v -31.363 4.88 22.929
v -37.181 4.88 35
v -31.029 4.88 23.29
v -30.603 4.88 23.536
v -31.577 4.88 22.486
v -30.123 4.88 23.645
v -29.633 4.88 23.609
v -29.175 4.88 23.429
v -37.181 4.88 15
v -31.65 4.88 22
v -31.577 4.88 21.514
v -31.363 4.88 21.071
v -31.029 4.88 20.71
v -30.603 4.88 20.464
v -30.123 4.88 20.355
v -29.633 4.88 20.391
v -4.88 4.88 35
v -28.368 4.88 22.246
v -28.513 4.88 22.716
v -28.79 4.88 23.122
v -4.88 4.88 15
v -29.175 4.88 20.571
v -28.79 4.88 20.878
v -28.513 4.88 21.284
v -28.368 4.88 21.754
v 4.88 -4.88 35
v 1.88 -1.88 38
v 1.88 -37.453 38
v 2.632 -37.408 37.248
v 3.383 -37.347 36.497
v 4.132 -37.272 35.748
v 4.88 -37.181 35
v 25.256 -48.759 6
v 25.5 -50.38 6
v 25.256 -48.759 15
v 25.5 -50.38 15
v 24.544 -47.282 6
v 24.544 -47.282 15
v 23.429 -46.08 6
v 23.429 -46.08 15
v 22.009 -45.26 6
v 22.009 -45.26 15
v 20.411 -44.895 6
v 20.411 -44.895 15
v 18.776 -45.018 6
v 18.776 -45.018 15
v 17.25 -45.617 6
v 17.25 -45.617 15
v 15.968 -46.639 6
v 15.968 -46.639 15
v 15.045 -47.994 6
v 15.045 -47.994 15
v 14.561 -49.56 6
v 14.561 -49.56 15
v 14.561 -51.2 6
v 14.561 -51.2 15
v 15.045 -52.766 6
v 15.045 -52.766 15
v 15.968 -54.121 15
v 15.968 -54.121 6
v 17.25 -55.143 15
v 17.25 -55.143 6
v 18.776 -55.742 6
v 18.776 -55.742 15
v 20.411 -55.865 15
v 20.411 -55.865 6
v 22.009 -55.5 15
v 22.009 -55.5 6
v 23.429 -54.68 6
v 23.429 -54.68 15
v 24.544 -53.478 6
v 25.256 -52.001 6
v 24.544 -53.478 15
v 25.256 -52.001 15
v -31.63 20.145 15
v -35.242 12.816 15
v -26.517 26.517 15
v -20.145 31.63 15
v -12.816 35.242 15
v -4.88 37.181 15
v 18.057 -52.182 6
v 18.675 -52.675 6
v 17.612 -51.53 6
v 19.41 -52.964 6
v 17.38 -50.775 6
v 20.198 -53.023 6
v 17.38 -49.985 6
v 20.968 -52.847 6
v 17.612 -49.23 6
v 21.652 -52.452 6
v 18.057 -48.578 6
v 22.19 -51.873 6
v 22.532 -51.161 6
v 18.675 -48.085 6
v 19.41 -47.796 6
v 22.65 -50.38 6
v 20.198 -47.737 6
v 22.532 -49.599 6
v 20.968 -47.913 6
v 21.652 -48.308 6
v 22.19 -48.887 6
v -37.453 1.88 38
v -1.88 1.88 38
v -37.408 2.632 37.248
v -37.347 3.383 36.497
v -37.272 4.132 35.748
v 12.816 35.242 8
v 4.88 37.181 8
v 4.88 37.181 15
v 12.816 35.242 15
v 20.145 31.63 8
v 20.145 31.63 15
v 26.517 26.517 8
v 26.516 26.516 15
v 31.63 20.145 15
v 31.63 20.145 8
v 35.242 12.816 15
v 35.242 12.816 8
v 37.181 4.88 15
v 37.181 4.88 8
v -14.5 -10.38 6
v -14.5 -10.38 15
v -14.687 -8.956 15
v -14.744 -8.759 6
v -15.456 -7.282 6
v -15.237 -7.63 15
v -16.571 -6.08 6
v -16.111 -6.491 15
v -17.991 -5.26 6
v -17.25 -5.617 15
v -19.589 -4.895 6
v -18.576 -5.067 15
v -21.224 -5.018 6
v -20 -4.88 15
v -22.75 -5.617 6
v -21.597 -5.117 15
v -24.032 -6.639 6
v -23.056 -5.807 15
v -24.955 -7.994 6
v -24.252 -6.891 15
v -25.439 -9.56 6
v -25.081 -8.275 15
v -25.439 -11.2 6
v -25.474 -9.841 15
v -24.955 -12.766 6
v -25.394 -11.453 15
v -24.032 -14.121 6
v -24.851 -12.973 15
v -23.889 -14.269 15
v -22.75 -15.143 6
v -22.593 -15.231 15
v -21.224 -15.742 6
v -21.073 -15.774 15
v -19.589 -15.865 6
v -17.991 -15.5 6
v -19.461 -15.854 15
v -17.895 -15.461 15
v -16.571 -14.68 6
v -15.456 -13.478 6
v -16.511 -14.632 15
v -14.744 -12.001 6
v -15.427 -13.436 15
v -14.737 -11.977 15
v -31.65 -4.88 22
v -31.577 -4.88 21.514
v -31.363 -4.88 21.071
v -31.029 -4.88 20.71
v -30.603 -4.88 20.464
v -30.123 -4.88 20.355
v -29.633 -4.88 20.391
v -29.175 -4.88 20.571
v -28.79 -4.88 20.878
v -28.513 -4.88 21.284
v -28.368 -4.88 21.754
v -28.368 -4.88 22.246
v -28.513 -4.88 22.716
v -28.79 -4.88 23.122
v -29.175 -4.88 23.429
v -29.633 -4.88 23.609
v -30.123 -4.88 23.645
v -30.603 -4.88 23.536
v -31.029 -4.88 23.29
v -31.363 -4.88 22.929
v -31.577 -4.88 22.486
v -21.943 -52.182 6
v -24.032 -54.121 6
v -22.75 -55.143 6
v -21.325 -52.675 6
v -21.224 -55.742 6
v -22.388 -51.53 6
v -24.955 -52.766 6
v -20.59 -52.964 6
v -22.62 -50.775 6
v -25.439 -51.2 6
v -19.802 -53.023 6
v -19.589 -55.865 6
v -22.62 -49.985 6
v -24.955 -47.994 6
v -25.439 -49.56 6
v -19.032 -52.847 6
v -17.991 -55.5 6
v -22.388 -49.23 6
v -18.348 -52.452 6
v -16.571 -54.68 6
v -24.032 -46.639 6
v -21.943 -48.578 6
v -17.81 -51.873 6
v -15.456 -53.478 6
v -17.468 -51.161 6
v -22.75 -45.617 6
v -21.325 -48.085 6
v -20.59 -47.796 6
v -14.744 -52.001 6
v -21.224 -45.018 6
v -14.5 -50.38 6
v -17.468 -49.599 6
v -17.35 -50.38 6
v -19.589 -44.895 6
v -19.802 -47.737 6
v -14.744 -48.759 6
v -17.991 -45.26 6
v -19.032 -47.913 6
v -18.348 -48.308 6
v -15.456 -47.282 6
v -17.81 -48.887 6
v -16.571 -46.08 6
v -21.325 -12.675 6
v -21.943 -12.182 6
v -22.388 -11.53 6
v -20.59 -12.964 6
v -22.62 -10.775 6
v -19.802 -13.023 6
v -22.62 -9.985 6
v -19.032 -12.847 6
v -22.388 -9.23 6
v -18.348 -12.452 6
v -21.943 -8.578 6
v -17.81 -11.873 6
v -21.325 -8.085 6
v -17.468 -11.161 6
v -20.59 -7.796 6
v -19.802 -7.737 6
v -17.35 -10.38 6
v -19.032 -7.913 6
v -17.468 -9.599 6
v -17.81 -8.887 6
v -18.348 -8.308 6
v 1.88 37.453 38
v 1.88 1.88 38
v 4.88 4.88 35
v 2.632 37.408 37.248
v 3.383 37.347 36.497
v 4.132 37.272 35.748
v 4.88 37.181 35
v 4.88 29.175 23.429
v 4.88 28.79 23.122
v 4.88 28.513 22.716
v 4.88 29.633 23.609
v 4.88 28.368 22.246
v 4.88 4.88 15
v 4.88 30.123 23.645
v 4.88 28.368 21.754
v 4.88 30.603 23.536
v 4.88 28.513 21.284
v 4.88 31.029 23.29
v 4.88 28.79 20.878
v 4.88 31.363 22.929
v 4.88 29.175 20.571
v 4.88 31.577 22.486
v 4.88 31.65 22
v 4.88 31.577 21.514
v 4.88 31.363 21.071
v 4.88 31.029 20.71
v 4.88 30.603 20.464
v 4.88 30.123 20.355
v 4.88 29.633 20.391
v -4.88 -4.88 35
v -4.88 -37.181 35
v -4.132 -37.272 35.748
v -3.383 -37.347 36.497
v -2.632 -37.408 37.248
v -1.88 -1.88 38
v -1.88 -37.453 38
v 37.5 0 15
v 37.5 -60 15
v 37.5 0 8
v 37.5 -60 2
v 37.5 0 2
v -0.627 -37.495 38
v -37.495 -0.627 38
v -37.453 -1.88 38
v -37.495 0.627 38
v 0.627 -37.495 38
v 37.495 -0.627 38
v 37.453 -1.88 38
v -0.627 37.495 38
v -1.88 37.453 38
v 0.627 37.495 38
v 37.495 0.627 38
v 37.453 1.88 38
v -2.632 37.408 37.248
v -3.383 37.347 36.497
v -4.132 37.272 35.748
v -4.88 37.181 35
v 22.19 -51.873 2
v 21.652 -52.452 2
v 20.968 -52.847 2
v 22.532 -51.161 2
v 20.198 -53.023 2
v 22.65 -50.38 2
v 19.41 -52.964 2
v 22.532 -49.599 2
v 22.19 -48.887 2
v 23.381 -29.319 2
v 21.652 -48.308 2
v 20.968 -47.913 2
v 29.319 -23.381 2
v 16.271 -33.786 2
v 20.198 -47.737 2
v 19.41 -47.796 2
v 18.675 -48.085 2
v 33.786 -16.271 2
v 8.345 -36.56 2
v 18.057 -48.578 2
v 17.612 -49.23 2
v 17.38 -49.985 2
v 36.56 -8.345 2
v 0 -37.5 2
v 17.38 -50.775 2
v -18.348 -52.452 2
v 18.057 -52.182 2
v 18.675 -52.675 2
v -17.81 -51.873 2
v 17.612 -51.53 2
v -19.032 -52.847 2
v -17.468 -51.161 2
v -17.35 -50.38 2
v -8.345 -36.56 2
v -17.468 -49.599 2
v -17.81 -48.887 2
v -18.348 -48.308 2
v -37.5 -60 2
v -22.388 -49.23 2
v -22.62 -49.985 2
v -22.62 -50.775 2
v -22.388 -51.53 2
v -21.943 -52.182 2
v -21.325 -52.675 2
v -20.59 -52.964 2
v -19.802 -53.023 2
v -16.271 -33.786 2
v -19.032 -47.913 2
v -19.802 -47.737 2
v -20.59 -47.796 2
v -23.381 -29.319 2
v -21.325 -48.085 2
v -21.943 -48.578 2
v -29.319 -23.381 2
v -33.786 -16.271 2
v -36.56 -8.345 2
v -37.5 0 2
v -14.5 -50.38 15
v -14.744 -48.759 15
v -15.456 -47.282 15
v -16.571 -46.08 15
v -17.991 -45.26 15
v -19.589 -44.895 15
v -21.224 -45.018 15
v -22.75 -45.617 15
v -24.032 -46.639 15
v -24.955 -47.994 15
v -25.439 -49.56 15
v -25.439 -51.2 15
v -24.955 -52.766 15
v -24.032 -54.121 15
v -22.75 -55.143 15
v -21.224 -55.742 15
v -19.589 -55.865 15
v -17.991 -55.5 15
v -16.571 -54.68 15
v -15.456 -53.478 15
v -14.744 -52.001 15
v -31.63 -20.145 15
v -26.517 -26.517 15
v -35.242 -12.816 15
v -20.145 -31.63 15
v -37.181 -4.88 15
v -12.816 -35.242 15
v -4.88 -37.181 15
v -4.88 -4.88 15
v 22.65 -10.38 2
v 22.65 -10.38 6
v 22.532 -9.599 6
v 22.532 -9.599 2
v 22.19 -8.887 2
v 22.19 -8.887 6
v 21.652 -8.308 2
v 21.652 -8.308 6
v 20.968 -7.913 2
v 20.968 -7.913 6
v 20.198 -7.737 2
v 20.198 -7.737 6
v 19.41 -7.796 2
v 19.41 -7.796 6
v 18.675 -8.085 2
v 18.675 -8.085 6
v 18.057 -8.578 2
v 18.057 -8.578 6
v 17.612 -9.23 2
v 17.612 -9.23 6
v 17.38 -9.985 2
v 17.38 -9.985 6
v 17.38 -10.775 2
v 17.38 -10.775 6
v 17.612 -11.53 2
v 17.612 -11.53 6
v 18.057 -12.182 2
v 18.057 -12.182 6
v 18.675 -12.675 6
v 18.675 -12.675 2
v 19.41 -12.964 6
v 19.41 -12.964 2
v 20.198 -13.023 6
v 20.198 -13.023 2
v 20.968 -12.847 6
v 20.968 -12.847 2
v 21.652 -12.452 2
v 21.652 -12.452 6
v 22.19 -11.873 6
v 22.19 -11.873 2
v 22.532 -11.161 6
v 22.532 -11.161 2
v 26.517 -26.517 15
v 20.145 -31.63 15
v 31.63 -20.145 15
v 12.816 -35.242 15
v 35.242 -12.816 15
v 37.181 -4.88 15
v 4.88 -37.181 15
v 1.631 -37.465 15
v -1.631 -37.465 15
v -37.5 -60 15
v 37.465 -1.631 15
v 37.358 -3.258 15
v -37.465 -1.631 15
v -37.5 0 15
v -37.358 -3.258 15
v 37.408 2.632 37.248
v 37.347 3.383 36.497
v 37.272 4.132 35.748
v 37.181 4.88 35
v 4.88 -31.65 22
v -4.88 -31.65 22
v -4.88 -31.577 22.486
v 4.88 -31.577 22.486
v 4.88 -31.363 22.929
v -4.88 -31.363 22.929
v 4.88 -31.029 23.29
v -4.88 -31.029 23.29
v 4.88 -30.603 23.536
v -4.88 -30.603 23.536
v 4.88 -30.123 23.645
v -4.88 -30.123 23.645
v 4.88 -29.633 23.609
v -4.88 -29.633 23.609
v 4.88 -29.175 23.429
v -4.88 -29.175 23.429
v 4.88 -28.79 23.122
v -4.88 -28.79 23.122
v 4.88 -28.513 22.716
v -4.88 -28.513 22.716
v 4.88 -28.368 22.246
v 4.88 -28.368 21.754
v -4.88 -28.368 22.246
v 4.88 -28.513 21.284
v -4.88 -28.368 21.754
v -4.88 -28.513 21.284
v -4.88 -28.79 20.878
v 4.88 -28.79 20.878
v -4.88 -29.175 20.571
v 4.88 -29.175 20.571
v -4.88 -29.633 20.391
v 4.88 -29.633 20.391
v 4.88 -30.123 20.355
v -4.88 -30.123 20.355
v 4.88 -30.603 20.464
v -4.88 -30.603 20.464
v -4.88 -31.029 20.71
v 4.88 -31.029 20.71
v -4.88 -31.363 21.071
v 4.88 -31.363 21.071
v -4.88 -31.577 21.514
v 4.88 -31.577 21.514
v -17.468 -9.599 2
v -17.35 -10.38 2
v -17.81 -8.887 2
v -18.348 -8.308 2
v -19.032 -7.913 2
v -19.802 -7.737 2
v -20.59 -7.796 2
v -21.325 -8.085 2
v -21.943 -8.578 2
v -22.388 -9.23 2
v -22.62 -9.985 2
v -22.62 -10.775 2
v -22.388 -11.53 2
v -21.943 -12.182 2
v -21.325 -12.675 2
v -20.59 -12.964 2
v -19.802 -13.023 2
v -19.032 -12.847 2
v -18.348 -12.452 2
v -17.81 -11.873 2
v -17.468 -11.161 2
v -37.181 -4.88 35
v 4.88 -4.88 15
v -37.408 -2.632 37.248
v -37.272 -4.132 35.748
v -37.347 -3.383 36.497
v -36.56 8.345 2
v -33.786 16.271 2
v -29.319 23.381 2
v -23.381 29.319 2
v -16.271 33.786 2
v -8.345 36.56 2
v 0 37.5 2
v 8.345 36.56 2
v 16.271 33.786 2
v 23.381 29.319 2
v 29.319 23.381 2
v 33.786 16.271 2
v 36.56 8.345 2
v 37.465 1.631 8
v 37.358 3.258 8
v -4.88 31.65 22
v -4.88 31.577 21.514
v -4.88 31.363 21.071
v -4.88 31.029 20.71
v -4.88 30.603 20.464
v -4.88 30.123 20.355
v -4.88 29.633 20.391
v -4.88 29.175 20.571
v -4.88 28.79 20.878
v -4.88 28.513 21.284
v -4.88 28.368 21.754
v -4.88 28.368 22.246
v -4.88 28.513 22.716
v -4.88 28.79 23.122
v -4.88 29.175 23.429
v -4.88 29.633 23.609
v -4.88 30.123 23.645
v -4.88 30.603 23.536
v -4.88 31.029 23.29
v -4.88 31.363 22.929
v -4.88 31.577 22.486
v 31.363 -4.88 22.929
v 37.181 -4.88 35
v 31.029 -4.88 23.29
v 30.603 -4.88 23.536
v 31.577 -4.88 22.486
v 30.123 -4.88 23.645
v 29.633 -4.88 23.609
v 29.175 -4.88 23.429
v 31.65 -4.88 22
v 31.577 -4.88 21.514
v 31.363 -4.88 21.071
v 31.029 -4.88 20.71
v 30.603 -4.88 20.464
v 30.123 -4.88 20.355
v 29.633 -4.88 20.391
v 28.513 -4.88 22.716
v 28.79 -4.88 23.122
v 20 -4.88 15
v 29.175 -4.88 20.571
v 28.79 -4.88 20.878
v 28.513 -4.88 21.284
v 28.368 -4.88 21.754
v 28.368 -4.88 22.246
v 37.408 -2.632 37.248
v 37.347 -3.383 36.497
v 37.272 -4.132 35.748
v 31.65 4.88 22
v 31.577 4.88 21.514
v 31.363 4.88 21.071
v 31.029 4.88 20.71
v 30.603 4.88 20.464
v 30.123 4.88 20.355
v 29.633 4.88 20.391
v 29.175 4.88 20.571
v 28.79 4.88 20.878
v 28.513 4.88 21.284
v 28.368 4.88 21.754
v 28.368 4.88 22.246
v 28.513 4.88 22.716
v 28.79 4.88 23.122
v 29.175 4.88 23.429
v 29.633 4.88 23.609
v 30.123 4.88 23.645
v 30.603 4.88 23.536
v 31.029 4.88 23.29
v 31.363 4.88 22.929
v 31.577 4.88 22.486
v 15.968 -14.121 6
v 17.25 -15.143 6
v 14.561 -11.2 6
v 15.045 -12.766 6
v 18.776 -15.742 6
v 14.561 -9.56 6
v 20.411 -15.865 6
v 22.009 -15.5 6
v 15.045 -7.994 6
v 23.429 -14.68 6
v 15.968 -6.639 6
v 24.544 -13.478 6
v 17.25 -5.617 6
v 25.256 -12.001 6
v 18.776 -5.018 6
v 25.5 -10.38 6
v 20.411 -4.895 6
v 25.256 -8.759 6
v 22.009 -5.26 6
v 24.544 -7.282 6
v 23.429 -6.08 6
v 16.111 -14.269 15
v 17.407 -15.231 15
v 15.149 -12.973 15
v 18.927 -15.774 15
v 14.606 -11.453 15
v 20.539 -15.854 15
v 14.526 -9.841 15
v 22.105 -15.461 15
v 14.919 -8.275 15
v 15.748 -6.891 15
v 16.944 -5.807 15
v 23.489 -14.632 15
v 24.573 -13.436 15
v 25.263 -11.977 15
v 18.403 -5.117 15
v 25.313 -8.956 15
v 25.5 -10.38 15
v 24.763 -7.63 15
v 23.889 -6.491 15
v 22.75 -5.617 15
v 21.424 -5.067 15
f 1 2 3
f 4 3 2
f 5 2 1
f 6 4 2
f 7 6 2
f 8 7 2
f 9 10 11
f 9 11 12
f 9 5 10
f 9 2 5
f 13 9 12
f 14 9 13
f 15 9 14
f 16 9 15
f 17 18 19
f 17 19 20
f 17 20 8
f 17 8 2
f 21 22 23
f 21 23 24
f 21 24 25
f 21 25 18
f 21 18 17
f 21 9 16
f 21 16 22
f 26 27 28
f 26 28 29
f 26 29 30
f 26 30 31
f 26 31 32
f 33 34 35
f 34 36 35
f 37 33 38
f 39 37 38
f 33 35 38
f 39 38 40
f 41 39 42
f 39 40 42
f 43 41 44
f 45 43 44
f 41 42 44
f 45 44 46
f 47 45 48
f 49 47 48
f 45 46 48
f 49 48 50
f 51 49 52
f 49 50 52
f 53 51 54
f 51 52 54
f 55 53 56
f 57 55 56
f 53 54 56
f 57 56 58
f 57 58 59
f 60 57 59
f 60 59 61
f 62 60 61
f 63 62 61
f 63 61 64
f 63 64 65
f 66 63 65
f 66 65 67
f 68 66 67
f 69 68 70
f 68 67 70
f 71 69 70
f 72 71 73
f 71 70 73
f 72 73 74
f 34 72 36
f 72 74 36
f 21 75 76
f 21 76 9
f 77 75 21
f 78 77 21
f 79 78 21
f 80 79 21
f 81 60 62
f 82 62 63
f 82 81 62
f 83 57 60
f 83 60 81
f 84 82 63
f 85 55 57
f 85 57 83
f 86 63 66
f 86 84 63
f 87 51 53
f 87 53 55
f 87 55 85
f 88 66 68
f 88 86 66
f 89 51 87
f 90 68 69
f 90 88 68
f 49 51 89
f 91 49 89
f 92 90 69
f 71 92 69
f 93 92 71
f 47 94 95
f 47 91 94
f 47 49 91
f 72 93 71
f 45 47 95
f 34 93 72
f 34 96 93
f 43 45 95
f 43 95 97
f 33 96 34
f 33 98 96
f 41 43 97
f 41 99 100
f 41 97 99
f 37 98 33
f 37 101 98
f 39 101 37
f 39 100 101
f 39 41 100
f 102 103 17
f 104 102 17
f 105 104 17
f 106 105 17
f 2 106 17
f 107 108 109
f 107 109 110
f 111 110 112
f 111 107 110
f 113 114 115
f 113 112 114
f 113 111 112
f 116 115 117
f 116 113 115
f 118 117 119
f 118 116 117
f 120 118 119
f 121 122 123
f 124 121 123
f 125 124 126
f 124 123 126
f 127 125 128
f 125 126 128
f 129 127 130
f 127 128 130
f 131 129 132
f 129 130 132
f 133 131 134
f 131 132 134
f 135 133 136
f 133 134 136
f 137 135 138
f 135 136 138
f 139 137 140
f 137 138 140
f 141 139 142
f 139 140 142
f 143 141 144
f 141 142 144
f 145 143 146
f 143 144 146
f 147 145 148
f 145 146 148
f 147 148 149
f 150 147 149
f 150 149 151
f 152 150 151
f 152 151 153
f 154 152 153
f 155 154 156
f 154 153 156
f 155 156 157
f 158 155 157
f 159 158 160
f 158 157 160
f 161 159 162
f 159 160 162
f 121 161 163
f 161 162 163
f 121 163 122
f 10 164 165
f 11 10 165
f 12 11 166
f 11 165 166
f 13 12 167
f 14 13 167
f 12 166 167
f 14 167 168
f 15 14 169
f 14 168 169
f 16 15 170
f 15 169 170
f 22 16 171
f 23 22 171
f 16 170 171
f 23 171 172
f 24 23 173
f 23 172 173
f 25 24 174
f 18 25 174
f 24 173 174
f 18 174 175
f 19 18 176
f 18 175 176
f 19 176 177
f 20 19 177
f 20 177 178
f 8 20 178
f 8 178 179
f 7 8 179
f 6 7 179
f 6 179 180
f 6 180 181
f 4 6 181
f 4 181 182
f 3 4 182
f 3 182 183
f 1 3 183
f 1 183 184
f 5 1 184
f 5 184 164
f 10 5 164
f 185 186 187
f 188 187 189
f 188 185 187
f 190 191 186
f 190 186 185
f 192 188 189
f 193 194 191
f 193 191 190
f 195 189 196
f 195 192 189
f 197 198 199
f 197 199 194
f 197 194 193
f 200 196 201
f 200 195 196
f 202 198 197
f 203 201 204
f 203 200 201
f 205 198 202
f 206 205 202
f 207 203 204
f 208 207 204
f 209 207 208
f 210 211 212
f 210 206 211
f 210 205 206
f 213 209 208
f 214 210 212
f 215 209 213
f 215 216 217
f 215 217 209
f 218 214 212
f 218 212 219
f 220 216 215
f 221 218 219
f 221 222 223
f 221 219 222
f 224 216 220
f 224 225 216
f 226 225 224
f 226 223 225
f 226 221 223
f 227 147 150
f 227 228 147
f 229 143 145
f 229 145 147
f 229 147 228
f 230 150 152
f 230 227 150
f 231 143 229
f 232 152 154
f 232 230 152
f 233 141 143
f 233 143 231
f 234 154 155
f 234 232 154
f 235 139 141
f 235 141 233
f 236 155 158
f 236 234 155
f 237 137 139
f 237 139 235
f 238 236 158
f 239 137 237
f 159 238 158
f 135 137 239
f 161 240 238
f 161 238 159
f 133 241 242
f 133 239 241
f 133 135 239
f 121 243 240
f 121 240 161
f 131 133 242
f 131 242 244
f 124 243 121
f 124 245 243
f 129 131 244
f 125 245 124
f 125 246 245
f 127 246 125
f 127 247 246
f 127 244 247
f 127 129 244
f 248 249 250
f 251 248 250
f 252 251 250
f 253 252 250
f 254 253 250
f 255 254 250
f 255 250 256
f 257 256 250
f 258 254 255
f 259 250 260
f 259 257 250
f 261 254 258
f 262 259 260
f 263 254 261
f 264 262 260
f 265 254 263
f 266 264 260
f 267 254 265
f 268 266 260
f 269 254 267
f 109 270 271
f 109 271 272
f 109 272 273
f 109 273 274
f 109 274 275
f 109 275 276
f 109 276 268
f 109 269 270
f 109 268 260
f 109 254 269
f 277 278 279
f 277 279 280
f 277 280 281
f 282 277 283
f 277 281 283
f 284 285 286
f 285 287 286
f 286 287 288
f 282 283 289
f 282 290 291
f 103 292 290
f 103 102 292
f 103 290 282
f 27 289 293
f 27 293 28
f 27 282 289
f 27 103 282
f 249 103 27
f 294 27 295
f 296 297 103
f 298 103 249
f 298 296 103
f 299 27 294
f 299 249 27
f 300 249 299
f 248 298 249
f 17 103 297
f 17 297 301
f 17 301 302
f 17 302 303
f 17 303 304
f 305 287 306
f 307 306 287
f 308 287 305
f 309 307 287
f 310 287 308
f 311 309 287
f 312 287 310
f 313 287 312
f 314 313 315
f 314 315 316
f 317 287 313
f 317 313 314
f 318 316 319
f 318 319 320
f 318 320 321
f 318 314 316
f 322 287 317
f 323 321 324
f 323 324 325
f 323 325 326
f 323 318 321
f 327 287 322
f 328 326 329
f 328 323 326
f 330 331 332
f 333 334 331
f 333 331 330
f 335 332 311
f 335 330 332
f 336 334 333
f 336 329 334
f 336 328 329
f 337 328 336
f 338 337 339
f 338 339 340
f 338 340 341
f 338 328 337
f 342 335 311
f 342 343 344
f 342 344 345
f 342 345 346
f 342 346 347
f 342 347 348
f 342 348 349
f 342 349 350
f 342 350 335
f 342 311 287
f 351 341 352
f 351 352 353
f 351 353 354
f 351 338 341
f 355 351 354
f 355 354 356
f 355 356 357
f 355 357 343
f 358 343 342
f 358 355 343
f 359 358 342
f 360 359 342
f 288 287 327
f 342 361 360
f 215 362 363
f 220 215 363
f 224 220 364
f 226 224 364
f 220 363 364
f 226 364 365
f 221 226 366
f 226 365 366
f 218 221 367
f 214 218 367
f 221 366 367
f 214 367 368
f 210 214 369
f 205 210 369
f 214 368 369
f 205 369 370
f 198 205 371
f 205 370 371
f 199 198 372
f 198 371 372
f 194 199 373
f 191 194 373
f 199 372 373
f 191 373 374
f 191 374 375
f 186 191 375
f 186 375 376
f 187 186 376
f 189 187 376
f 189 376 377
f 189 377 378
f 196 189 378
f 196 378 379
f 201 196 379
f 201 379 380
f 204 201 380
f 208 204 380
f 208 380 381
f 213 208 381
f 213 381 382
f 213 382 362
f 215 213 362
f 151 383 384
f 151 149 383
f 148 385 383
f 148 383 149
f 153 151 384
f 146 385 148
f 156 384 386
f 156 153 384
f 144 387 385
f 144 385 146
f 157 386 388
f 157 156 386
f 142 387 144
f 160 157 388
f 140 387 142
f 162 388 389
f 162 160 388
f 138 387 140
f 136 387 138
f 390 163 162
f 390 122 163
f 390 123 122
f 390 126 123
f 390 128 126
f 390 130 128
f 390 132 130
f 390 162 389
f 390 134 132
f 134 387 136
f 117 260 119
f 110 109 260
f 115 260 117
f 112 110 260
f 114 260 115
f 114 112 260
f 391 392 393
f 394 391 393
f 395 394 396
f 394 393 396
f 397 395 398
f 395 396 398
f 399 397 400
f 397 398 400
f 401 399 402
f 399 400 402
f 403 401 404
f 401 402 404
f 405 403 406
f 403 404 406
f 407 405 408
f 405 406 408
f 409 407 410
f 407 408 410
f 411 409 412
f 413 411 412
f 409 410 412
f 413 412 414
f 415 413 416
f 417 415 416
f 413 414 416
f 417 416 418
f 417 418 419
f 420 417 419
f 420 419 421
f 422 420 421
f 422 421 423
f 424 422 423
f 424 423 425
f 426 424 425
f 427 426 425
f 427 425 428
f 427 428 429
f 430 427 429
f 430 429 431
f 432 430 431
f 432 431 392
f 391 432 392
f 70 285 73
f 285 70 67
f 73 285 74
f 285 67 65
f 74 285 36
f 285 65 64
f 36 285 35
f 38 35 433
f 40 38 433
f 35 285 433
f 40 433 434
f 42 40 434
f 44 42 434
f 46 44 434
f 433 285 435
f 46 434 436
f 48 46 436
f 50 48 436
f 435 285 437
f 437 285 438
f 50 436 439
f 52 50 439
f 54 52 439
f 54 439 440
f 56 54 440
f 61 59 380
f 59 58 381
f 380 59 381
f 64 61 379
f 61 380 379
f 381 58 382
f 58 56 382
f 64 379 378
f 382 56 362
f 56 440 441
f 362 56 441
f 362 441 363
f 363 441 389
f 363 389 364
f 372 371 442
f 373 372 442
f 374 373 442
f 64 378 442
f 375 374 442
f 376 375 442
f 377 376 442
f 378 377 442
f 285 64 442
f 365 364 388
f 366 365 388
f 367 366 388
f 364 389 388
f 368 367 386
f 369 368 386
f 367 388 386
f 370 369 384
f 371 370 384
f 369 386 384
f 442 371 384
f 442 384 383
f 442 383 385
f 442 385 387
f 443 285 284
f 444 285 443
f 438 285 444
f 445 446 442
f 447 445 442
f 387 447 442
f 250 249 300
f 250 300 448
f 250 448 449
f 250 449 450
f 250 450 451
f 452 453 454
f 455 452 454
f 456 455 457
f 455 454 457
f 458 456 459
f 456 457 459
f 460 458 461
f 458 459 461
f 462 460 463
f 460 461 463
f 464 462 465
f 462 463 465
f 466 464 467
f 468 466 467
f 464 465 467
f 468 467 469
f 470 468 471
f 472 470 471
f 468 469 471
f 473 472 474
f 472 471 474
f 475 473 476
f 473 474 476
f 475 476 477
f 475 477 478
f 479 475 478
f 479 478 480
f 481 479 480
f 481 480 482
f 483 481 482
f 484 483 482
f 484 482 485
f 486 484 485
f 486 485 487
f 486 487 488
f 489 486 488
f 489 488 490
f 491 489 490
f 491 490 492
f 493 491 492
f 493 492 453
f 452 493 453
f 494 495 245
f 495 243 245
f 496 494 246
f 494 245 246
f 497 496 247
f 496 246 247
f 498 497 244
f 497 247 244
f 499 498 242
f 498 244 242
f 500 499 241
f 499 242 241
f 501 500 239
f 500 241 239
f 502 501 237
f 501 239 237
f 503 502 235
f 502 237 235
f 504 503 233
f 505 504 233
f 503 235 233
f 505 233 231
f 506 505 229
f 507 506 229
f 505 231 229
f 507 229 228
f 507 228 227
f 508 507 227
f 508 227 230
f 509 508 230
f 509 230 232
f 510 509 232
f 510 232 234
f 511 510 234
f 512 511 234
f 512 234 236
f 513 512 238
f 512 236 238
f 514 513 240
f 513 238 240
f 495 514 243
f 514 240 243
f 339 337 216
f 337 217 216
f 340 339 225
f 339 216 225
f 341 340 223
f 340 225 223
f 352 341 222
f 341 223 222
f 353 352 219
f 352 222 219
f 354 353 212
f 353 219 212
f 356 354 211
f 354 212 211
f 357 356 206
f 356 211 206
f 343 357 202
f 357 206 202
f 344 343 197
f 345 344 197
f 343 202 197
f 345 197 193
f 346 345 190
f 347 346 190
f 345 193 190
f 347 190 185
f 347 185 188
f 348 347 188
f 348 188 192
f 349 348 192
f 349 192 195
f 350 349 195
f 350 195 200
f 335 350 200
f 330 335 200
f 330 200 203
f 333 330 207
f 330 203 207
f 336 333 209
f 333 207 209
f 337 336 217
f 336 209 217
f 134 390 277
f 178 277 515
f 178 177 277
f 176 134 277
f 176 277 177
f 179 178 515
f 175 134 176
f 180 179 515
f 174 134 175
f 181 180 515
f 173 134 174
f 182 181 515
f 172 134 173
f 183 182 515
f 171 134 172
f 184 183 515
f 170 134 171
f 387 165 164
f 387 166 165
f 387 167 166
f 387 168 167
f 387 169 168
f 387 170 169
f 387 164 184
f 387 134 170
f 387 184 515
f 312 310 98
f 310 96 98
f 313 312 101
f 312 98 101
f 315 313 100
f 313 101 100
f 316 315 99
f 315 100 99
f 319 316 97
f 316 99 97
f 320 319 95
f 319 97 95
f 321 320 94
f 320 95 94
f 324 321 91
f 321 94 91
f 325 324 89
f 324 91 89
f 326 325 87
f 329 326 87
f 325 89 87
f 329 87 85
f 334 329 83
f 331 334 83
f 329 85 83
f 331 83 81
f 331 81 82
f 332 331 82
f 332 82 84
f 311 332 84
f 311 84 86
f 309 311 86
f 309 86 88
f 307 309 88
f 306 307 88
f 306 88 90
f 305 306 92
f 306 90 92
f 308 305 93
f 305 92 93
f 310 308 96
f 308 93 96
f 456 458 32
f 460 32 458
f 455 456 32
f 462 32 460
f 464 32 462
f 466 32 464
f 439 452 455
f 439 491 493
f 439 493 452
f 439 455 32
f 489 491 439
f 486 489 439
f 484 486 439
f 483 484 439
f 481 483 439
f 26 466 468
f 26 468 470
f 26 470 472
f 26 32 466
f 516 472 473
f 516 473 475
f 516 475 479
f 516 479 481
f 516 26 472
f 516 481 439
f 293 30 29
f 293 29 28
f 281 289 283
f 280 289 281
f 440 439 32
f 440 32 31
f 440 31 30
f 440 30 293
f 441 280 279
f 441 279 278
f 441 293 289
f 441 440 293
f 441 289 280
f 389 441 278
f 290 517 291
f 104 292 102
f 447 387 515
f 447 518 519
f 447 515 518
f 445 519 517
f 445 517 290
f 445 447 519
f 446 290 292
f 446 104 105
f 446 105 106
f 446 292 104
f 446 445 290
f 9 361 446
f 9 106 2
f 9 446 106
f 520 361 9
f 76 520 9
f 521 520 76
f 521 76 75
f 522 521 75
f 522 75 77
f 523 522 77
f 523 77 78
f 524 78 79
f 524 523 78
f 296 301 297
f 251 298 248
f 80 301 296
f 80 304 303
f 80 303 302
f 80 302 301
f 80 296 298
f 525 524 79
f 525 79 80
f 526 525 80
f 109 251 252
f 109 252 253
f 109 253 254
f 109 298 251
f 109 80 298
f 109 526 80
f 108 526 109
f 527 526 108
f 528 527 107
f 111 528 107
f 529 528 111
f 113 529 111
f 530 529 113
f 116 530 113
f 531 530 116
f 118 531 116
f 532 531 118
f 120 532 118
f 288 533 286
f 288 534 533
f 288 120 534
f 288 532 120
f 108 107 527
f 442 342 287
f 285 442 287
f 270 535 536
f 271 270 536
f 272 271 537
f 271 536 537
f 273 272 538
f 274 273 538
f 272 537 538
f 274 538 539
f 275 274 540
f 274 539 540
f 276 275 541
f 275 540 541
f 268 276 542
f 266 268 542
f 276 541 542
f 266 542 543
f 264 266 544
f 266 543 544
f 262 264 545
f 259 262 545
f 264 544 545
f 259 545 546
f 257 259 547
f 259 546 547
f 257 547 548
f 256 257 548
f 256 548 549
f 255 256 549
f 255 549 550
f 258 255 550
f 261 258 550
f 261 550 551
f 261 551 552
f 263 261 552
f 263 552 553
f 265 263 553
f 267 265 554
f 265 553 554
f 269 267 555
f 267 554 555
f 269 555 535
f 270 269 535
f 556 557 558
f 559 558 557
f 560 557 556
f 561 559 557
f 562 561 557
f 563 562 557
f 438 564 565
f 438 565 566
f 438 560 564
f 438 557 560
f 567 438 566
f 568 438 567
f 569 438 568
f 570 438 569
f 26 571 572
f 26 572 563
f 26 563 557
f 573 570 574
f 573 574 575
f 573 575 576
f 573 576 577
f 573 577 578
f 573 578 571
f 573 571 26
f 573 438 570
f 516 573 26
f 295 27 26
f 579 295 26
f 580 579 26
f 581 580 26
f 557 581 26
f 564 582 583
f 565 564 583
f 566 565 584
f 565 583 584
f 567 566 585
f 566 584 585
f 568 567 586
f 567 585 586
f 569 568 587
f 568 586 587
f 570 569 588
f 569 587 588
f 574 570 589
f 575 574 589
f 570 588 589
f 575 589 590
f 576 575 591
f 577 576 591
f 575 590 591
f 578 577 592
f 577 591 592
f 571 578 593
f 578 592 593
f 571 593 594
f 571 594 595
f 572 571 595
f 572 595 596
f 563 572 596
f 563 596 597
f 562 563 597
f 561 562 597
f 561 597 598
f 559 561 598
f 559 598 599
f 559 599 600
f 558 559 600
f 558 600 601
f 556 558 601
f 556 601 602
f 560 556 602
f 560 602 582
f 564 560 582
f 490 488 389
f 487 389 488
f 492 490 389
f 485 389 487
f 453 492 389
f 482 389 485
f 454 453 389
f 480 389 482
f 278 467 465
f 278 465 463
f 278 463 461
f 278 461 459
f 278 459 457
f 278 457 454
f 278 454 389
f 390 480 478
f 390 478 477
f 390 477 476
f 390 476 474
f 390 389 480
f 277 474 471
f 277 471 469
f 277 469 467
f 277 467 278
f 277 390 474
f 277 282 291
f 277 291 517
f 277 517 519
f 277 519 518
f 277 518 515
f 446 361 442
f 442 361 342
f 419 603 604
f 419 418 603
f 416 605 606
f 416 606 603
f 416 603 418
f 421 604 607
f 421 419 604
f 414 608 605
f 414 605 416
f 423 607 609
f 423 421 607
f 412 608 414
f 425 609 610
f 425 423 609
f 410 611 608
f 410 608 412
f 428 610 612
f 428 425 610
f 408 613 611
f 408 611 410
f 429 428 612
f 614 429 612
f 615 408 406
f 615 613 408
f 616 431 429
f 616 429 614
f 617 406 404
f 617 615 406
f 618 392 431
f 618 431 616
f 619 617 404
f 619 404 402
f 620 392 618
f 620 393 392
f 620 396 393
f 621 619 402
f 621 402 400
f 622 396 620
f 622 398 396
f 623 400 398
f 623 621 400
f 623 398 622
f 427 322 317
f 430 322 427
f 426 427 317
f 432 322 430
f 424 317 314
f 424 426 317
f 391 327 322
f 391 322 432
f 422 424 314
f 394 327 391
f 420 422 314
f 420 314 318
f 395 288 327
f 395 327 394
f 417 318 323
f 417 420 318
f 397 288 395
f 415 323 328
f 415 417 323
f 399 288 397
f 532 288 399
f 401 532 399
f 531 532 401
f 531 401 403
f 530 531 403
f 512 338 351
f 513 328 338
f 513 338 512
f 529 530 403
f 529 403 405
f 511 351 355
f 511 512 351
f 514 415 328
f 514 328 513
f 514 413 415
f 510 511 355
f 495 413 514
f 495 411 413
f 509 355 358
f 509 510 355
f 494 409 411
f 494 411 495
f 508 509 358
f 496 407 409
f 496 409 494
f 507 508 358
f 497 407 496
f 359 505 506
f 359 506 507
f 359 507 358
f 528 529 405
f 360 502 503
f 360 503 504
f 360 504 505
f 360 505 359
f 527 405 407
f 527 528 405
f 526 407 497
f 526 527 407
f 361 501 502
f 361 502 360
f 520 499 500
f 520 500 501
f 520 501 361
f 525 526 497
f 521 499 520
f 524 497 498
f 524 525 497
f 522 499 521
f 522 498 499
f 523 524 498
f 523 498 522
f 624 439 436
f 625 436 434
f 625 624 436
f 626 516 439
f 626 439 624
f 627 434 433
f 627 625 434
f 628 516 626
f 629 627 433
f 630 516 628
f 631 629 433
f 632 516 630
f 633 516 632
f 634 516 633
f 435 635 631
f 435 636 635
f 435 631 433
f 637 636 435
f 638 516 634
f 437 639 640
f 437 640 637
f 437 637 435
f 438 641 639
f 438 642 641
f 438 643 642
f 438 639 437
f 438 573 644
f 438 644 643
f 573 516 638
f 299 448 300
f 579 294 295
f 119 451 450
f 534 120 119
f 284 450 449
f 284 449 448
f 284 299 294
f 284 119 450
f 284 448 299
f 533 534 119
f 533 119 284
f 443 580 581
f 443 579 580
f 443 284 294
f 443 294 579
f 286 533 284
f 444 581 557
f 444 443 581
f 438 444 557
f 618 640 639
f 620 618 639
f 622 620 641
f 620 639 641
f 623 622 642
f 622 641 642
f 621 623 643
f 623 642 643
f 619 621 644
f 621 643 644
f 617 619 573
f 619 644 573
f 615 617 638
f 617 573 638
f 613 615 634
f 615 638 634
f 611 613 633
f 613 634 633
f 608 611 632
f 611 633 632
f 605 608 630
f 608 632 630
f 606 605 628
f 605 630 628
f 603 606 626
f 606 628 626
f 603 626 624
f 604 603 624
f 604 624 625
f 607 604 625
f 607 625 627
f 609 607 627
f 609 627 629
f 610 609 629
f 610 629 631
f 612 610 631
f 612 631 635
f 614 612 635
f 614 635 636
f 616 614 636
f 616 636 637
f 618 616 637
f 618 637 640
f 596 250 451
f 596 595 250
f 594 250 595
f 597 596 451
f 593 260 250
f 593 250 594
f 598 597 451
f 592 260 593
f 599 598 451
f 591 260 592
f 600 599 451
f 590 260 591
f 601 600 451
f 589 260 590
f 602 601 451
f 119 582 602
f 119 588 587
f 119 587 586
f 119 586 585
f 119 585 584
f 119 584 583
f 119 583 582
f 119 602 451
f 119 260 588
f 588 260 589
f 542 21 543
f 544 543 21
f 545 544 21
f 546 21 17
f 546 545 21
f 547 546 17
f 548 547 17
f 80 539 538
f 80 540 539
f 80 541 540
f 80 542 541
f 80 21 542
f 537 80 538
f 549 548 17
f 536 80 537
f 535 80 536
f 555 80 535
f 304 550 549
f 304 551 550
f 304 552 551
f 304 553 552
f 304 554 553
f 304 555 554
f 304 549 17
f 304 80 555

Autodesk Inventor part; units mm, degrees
ref_plane "YZ Plane" through (0, 0, 0) normal (1, 0, 0) x (0, 1, 0)
ref_plane "XZ Plane" through (0, 0, 0) normal (0, 1, 0) x (-1, 0, 0)
ref_plane "XY Plane" through (0, 0, 0) normal (0, 0, 1) x (1, 0, 0)
sketch "Sketch1" plane through (0, 0, 0) normal (0, 0, 1) x (1, 0, 0)
  circle A0 centre (0, 0) radius 37.5
  line L0 (0, 0) -> (0, -25)
  circle A1 centre (0, -25) radius 3
  dimension "d0" = 75
  dimension "d1" = 25
  dimension "d2" = 6
extrude "Extrusion1" add sketch "Sketch1" along normal blind 8 contours A0 | A1
sketch "Sketch2" plane through (0, 0, 8) normal (0, 0, 1) x (1, 0, 0)
  line L0 (0, 0) -> (17.6777, 17.6777)
  line L1 (0, 0) -> (25, 0) construction
  circle A0 centre (17.6777, 17.6777) radius 3.15
  circle A1 centre (-17.6777, 17.6777) radius 3.15
  circle A2 centre (-17.6777, -17.6777) radius 3.15
  circle A3 centre (17.6777, -17.6777) radius 3.15
  dimension "d5" = 25
  dimension "d6" = 45
  dimension "d7" = 6.3
  dimension "d10" = 360
extrude "Extrusion2" cut sketch "Sketch2" against normal blind 10
sketch "Sketch3" plane through (0, 0, 8) normal (0, 0, 1) x (1, 0, 0)
  arc A0 (-21.9203, 13.435) -> (-13.435, 21.9203) centre (-17.6777, 17.6777) ccw
  line L0 (-17.6777, 17.6777) -> (-11.6777, 17.6777) construction
  line L1 (-13.435, 21.9203) -> (-19.9189, 28.4042)
  line L2 (-21.9203, 13.435) -> (-28.4042, 19.9189)
  line L3 (-28.4042, 19.9189) -> (-19.9189, 28.4042)
  arc A1 (-13.435, -21.9203) -> (-21.9203, -13.435) centre (-17.6777, -17.6777) ccw
  line L4 (-17.6777, -17.6777) -> (-17.6777, -11.6777) construction
  line L5 (-21.9203, -13.435) -> (-28.4042, -19.9189)
  line L6 (-13.435, -21.9203) -> (-19.9189, -28.4042)
  line L7 (-19.9189, -28.4042) -> (-28.4042, -19.9189)
  arc A2 (21.9203, -13.435) -> (13.435, -21.9203) centre (17.6777, -17.6777) ccw
  line L8 (17.6777, -17.6777) -> (11.6777, -17.6777) construction
  line L9 (13.435, -21.9203) -> (19.9189, -28.4042)
  line L10 (21.9203, -13.435) -> (28.4042, -19.9189)
  line L11 (28.4042, -19.9189) -> (19.9189, -28.4042)
  arc A3 (13.435, 21.9203) -> (21.9203, 13.435) centre (17.6777, 17.6777) ccw
  line L12 (17.6777, 17.6777) -> (17.6777, 11.6777) construction
  line L13 (21.9203, 13.435) -> (28.4042, 19.9189)
  line L14 (13.435, 21.9203) -> (19.9189, 28.4042)
  line L15 (19.9189, 28.4042) -> (28.4042, 19.9189)
  circle A4 centre (0, 0) radius 31.5
  point P0 (-26.1087, 17.6234)
  point P1 (-26.1087, -17.6234)
  point P2 (-17.6234, -26.1087)
  point P3 (17.6234, -26.1087)
  point P4 (26.1087, -17.6234)
  point P5 (26.1087, 17.6234)
  point P6 (17.6234, 26.1087)
  point P7 (-17.6234, 26.1087)
  dimension "d14" = 12
  dimension "d18" = 360
sketch "Sketch4" plane through (0, 0, 0) normal (0, 0, -1) x (-1, 0, 0)
  circle A0 centre (0, 0) radius 42.8826
extrude "Extrusion4" cut sketch "Sketch4" against normal blind 2
sketch "Sketch5" plane through (0, 0, 8) normal (0, 0, 1) x (1, 0, 0)
  line L0 (0, 0) -> (8, 0)
  line L1 (8, 0) -> (8, -40)
  line L2 (8, -40) -> (-8, -40)
  line L3 (-8, -40) -> (-8, 40)
  line L4 (-8, 40) -> (8, 40)
  line L5 (8, 40) -> (8, -40)
  line L6 (0, 0) -> (0, 8)
  line L7 (0, 8) -> (40, 8)
  line L8 (40, 8) -> (40, -8)
  line L9 (40, -8) -> (-40, -8)
  line L10 (-40, -8) -> (-40, 8)
  line L11 (-40, 8) -> (40, 8)
  line L12 (0, 0) -> (0, 40)
  line L13 (0, 40) -> (-5, 40)
  line L14 (-5, 40) -> (5, 40)
  line L15 (5, 40) -> (5, -40)
  line L16 (5, -40) -> (-5, -40)
  line L17 (-5, -40) -> (-5, 40)
  point P0 (8, -8)
  point P1 (8, 8)
  point P2 (-8, 8)
  point P3 (-8, -8)
  dimension "d24" = 8
  dimension "d25" = 40
  dimension "d26" = 16
  dimension "d27" = 80
  dimension "d30" = 90
  dimension "d34" = 5
  dimension "d35" = 10
sketch "Sketch6" plane through (0, 0, 8) normal (0, 0, 1) x (1, 0, 0)
  line L0 (0, 0) -> (0, 40)
  line L1 (0, 40) -> (-5, 40)
  line L2 (-5, 40) -> (5, 40)
  line L3 (5, 40) -> (5, -40)
  line L4 (5, -40) -> (-5, -40)
  line L5 (-5, -40) -> (-5, 40)
  line L6 (0, 0) -> (-40, 0)
  line L7 (-40, 0) -> (-40, -5)
  line L8 (-40, -5) -> (-40, 5)
  line L9 (-40, 5) -> (40, 5)
  line L10 (40, 5) -> (40, -5)
  line L11 (40, -5) -> (-40, -5)
  circle A0 centre (0, 0) radius 37.5
  point P0 (5, -5)
  point P1 (5, 5)
  point P2 (-5, 5)
  point P3 (-5, -5)
  point P4 (37.1652, 5)
  point P5 (5, 37.1652)
  point P6 (-5, 37.1652)
  point P7 (-37.1652, 5)
  point P8 (-37.1652, -5)
  point P9 (-5, -37.1652)
  point P10 (5, -37.1652)
  point P11 (37.1652, -5)
  dimension "d36" = 40
  dimension "d37" = 5
  dimension "d38" = 10
  dimension "d39" = 80
  dimension "d42" = 90
  dimension "d46" = 75
extrude "Extrusion7" add sketch "Sketch6" along normal blind 30 contours L6 L5 L9 L0 | L0 L9 L3 L11 L5 L6 | L9 L5 A0 L0 | L0 A0 L3 L9 | L6 A0 L9 L5 | L5 L11 A0 L6 | L9 A0 L11 L3 | L11 L3 A0 L5
sketch "Sketch7" plane through (5, 5, 8) normal (0, 1, 0) x (1, 0, 0)
  line L0 (0, 0) -> (0, -30) projected
  line L1 (0, 0) -> (-5, 0)
  line L2 (-5, 0) -> (25, 0)
  line L3 (0, 0) -> (32.1652, 0) projected
  line L4 (25, 0) -> (25, -14)
  circle A0 centre (25, -14) radius 1.65
  point P0 (-5, 8)
  dimension "d49" = 5
  dimension "d50" = 30
  dimension "d51" = 14
  dimension "d52" = 3.3
extrude "Extrusion8" cut sketch "Sketch7" against normal blind 20
ref_plane "Work Plane1" through (5, 0, 8) normal (0, 1, 0) x (1, 0, 0)
ref_plane "Work Plane2" through (0, 5, 8) normal (1, 0, 0) x (0, 0, -1)
pattern_circular "Circular Pattern2" count 2 over 90 about axis through (0, 0, 8) along (0, 0, 1) of "Extrusion8"
sketch "Sketch8" plane through (-37.1652, 5, 8) normal (0, 1, 0) x (1, 0, 0)
  line L0 (32.1652, 0) -> (32.1652, -30) projected
  line L1 (32.1652, 0) -> (37.1652, 0)
  line L2 (37.1652, 0) -> (5.9902, 0)
  line L3 (22.6375, 0) -> (16.3375, 0) projected
  line L4 (5.9902, 0) -> (5.9902, -14)
  circle A0 centre (5.9902, -14) radius 2.15
  point P0 (37.1652, 8)
  dimension "d61" = 31.175
  dimension "d62" = 14
  dimension "d63" = 4.3
extrude "Extrusion9" [suppressed]
pattern_circular "Circular Pattern3" count 2 over 360 about axis through (0, 0, 8) along (0, 0, -1) of "Extrusion8"
sketch "Sketch10" plane through (5, 5, 8) normal (1, 0, 0) x (0, 0, -1)
  line L0 (0, 0) -> (-30, 0) projected
  line L1 (0, 0) -> (-30, 0)
  line L2 (-30, 0) -> (-30, 35.3175)
  line L3 (-30, 35.3175) -> (0, 35.3175)
  line L4 (0, 35.3175) -> (0, 0)
  line L5 (0, -10) -> (-30, -10) projected
  line L6 (0, -10) -> (-32.3439, -10)
  line L7 (-32.3439, -10) -> (-32.3439, -45.8466)
  line L8 (-32.3439, -45.8466) -> (0, -45.8466)
  line L9 (0, -45.8466) -> (0, -10)
  point P0 (8, -5)
extrude "Extrusion11" cut sketch "Sketch10" against normal blind 0.12
mirror "Mirror2" about plane through (0, 5, 8) normal (1, 0, 0) of "Extrusion11"
sketch "Sketch11" plane through (37.1652, 5, 38) normal (0, 1, 0) x (1, 0, 0)
  line L0 (-32.2852, 30) -> (-32.2852, 0) projected
  line L1 (-32.2852, 30) -> (5.1404, 30)
  line L2 (5.1404, 30) -> (5.1404, -1.2125)
  line L3 (5.1404, -1.2125) -> (-32.2852, -1.2125)
  line L4 (-32.2852, -1.2125) -> (-32.2852, 30)
  line L5 (-74.3303, 30) -> (-42.0452, 30) projected
  line L6 (-42.0452, 30) -> (-76.613, 30)
  line L7 (-76.613, 30) -> (-76.613, -1.2125)
  line L8 (-76.613, -1.2125) -> (-42.0452, -1.2125)
  line L9 (-42.0452, -1.2125) -> (-42.0452, 30)
  point P0 (-37.1652, 38)
extrude "Extrusion12" cut sketch "Sketch11" against normal blind 0.12
mirror "Mirror3" about plane through (5, 0, 8) normal (0, 1, 0) of "Extrusion12"
mirror "Mirror4" about plane through (5, 0, 8) normal (0, 1, 0) of "Extrusion8", "Circular Pattern2"
chamfer "Chamfer4" distance 3 angle 45 8 edges at (21.0306, 4.88, 38) (-21.0306, 4.88, 38) (4.88, -21.0306, 38) (4.88, 21.0306, 38) (-4.88, -21.0306, 38) (-4.88, 21.0306, 38) (21.0306, -4.88, 38) (-21.0306, -4.88, 38)
sketch "Sketch13" plane through (0, 0, 8) normal (0, 0, 1) x (1, 0, 0)
  arc A0 (37.1811, 4.88) -> (4.88, 37.1811) centre (0, 0) ccw projected
  circle A1 centre (0, 0) radius 37.5
  line L0 (37.1811, 4.88) -> (4.88, 4.88) projected
  line L1 (4.88, 4.88) -> (4.88, 37.1811) projected
  line L2 (37.1811, 4.88) -> (4.88, 4.88)
  line L3 (4.88, 4.88) -> (4.88, 37.1811)
  line L4 (4.88, 37.1811) -> (37.1811, 37.1811)
  line L5 (37.1811, 37.1811) -> (37.1811, 4.88)
  circle A2 centre (17.6777, 17.6777) radius 3.15 projected
  circle A3 centre (17.6777, 17.6777) radius 6
  line L6 (0, 0) -> (0, 7.2893)
  line L7 (0, 0) -> (7.7636, 0)
  arc A4 (-4.88, 37.1811) -> (-37.1811, 4.88) centre (0, 0) ccw
  circle A5 centre (0, 0) radius 37.5
  line L8 (-37.1811, 4.88) -> (-4.88, 4.88)
  line L9 (-4.88, 4.88) -> (-4.88, 37.1811)
  line L10 (-37.1811, 4.88) -> (-4.88, 4.88)
  line L11 (-4.88, 4.88) -> (-4.88, 37.1811)
  line L12 (-4.88, 37.1811) -> (-37.1811, 37.1811)
  line L13 (-37.1811, 37.1811) -> (-37.1811, 4.88)
  circle A6 centre (-17.6777, 17.6777) radius 3.15
  circle A7 centre (-17.6777, 17.6777) radius 6
  arc A8 (4.88, -37.1811) -> (37.1811, -4.88) centre (0, 0) ccw
  circle A9 centre (0, 0) radius 37.5
  line L14 (37.1811, -4.88) -> (4.88, -4.88)
  line L15 (4.88, -4.88) -> (4.88, -37.1811)
  line L16 (37.1811, -4.88) -> (4.88, -4.88)
  line L17 (4.88, -4.88) -> (4.88, -37.1811)
  line L18 (4.88, -37.1811) -> (37.1811, -37.1811)
  line L19 (37.1811, -37.1811) -> (37.1811, -4.88)
  circle A10 centre (17.6777, -17.6777) radius 3.15
  circle A11 centre (17.6777, -17.6777) radius 6
  line L20 (0, 0) -> (0, -7.2893)
  arc A12 (-37.1811, -4.88) -> (-4.88, -37.1811) centre (0, 0) ccw
  circle A13 centre (0, 0) radius 37.5
  line L21 (-37.1811, -4.88) -> (-4.88, -4.88)
  line L22 (-4.88, -4.88) -> (-4.88, -37.1811)
  line L23 (-37.1811, -4.88) -> (-4.88, -4.88)
  line L24 (-4.88, -4.88) -> (-4.88, -37.1811)
  line L25 (-4.88, -37.1811) -> (-37.1811, -37.1811)
  line L26 (-37.1811, -37.1811) -> (-37.1811, -4.88)
  circle A14 centre (-17.6777, -17.6777) radius 3.15
  circle A15 centre (-17.6777, -17.6777) radius 6
  arc A16 (1.88, 37.4528) -> (-1.88, 37.4528) centre (0, 0) ccw projected
  line L27 (1.88, 37.4528) -> (-1.88, 37.4528)
  line L28 (4.88, 37.1811) -> (17.88, 37.1811)
  line L29 (4.88, 37.1811) -> (4.88, 24.0161)
  point P0 (-37.1811, -4.88)
  dimension "d96" = 12
  dimension "d97" = 13
  dimension "d98" = 13.165
extrude "Extrusion14" add sketch "Sketch13" along normal blind 7 contours L0 L1 A0 | A1 L15 L14 | L9 L8 A1 | A1 L21 L22
sketch "Sketch19" plane through (0, 0, 2) normal (0, 0, -1) x (-1, 0, 0)
  circle A0 centre (-17.6777, 17.6777) radius 3.15 projected
  circle A1 centre (-17.6777, 17.6777) radius 9.67
  circle A2 centre (17.6777, 17.6777) radius 3.15 projected
  circle A3 centre (17.6777, 17.6777) radius 9.0628
  circle A4 centre (17.6777, -17.6777) radius 3.15 projected
  circle A5 centre (17.6777, -17.6777) radius 10.6824
  circle A6 centre (-17.6777, -17.6777) radius 3.15 projected
  circle A7 centre (-17.6777, -17.6777) radius 10.6824
  point P0 (0, 0)
extrude "Extrusion19" add sketch "Sketch19" against normal blind 13 contours A0 | A1 | A2 | A3 | A4 | A5 | A6 | A7
sketch "Sketch21" plane through (0, 0, 2) normal (0, 0, -1) x (-1, 0, 0)
  circle A0 centre (0, 0) radius 37.5 projected
  line L0 (-37.5, 0) -> (37.5, 0)
  line L1 (37.5, 0) -> (37.5, -60)
  line L2 (37.5, -60) -> (-37.5, -60)
  line L3 (-37.5, -60) -> (-37.5, 0)
  dimension "d145" = 75
  dimension "d146" = 60
extrude "Extrusion22" add sketch "Sketch21" against normal blind 13 contours L1 L2 L3 A0
sketch "Sketch22" plane through (0, 0, 15) normal (0, 0, 1) x (1, 0, 0)
  line L0 (0, 0) -> (20, 0)
  line L1 (20, 0) -> (20, -4.88)
  line L2 (4.88, -4.88) -> (37.1811, -4.88) projected
  line L3 (20, -4.88) -> (20, -10.38)
  line L4 (0, 0) -> (-20, 0)
  line L5 (-20, 0) -> (-20, -4.88)
  line L6 (-37.1811, -4.88) -> (-4.88, -4.88) projected
  line L7 (-20, -4.88) -> (-20, -10.38)
  line L8 (-20, -10.38) -> (20, -10.38)
  line L9 (20, -10.38) -> (20, -50.38)
  line L10 (20, -50.38) -> (-20, -50.38)
  line L11 (-20, -50.38) -> (-20, -10.38)
  circle A0 centre (-20, -50.38) radius 2.65
  circle A1 centre (-20, -10.38) radius 2.65
  circle A2 centre (20, -10.38) radius 2.65
  circle A3 centre (20, -50.38) radius 2.65
  dimension "d149" = 20
  dimension "d150" = 5.5
  dimension "d151" = 20
  dimension "d152" = 5.5
  dimension "d153" = 40
  dimension "d154" = 40
  dimension "d155" = 5.3
  dimension "d156" = 5.3
  dimension "d157" = 5.3
  dimension "d158" = 5.3
extrude "Extrusion23" cut sketch "Sketch22" against normal blind 13 contours A2 L9 L3 | L3 L8 A2 | A1 L8 L7 | L7 L11 A1 | L9 A2 L8 | L8 A1 L11 | A0 L10 L11 | L11 L10 A0 | A3 L10 L9 | L9 L10 A3
sketch "Sketch23" plane through (0, 0, 15) normal (0, 0, 1) x (1, 0, 0)
  circle A0 centre (-20, -10.38) radius 2.65 projected
  circle A1 centre (-20, -10.38) radius 5.5
  line L0 (-37.1811, -4.88) -> (-4.88, -4.88) projected
  circle A2 centre (20, -10.38) radius 2.65 projected
  circle A3 centre (20, -10.38) radius 5.5
  circle A4 centre (20, -50.38) radius 2.65 projected
  circle A5 centre (20, -50.38) radius 5.5
  circle A6 centre (-20, -50.38) radius 2.65 projected
  circle A7 centre (-20, -50.38) radius 5.5
  point P0 (0, 0)
  dimension "d161" = 11
  dimension "d162" = 11
extrude "Extrusion24" cut sketch "Sketch23" against normal blind 9 contours A0 | A1 | A3 | A4 | A5 | A6 | A7
properties part number "Test_Stand_Mounting_Plate"
